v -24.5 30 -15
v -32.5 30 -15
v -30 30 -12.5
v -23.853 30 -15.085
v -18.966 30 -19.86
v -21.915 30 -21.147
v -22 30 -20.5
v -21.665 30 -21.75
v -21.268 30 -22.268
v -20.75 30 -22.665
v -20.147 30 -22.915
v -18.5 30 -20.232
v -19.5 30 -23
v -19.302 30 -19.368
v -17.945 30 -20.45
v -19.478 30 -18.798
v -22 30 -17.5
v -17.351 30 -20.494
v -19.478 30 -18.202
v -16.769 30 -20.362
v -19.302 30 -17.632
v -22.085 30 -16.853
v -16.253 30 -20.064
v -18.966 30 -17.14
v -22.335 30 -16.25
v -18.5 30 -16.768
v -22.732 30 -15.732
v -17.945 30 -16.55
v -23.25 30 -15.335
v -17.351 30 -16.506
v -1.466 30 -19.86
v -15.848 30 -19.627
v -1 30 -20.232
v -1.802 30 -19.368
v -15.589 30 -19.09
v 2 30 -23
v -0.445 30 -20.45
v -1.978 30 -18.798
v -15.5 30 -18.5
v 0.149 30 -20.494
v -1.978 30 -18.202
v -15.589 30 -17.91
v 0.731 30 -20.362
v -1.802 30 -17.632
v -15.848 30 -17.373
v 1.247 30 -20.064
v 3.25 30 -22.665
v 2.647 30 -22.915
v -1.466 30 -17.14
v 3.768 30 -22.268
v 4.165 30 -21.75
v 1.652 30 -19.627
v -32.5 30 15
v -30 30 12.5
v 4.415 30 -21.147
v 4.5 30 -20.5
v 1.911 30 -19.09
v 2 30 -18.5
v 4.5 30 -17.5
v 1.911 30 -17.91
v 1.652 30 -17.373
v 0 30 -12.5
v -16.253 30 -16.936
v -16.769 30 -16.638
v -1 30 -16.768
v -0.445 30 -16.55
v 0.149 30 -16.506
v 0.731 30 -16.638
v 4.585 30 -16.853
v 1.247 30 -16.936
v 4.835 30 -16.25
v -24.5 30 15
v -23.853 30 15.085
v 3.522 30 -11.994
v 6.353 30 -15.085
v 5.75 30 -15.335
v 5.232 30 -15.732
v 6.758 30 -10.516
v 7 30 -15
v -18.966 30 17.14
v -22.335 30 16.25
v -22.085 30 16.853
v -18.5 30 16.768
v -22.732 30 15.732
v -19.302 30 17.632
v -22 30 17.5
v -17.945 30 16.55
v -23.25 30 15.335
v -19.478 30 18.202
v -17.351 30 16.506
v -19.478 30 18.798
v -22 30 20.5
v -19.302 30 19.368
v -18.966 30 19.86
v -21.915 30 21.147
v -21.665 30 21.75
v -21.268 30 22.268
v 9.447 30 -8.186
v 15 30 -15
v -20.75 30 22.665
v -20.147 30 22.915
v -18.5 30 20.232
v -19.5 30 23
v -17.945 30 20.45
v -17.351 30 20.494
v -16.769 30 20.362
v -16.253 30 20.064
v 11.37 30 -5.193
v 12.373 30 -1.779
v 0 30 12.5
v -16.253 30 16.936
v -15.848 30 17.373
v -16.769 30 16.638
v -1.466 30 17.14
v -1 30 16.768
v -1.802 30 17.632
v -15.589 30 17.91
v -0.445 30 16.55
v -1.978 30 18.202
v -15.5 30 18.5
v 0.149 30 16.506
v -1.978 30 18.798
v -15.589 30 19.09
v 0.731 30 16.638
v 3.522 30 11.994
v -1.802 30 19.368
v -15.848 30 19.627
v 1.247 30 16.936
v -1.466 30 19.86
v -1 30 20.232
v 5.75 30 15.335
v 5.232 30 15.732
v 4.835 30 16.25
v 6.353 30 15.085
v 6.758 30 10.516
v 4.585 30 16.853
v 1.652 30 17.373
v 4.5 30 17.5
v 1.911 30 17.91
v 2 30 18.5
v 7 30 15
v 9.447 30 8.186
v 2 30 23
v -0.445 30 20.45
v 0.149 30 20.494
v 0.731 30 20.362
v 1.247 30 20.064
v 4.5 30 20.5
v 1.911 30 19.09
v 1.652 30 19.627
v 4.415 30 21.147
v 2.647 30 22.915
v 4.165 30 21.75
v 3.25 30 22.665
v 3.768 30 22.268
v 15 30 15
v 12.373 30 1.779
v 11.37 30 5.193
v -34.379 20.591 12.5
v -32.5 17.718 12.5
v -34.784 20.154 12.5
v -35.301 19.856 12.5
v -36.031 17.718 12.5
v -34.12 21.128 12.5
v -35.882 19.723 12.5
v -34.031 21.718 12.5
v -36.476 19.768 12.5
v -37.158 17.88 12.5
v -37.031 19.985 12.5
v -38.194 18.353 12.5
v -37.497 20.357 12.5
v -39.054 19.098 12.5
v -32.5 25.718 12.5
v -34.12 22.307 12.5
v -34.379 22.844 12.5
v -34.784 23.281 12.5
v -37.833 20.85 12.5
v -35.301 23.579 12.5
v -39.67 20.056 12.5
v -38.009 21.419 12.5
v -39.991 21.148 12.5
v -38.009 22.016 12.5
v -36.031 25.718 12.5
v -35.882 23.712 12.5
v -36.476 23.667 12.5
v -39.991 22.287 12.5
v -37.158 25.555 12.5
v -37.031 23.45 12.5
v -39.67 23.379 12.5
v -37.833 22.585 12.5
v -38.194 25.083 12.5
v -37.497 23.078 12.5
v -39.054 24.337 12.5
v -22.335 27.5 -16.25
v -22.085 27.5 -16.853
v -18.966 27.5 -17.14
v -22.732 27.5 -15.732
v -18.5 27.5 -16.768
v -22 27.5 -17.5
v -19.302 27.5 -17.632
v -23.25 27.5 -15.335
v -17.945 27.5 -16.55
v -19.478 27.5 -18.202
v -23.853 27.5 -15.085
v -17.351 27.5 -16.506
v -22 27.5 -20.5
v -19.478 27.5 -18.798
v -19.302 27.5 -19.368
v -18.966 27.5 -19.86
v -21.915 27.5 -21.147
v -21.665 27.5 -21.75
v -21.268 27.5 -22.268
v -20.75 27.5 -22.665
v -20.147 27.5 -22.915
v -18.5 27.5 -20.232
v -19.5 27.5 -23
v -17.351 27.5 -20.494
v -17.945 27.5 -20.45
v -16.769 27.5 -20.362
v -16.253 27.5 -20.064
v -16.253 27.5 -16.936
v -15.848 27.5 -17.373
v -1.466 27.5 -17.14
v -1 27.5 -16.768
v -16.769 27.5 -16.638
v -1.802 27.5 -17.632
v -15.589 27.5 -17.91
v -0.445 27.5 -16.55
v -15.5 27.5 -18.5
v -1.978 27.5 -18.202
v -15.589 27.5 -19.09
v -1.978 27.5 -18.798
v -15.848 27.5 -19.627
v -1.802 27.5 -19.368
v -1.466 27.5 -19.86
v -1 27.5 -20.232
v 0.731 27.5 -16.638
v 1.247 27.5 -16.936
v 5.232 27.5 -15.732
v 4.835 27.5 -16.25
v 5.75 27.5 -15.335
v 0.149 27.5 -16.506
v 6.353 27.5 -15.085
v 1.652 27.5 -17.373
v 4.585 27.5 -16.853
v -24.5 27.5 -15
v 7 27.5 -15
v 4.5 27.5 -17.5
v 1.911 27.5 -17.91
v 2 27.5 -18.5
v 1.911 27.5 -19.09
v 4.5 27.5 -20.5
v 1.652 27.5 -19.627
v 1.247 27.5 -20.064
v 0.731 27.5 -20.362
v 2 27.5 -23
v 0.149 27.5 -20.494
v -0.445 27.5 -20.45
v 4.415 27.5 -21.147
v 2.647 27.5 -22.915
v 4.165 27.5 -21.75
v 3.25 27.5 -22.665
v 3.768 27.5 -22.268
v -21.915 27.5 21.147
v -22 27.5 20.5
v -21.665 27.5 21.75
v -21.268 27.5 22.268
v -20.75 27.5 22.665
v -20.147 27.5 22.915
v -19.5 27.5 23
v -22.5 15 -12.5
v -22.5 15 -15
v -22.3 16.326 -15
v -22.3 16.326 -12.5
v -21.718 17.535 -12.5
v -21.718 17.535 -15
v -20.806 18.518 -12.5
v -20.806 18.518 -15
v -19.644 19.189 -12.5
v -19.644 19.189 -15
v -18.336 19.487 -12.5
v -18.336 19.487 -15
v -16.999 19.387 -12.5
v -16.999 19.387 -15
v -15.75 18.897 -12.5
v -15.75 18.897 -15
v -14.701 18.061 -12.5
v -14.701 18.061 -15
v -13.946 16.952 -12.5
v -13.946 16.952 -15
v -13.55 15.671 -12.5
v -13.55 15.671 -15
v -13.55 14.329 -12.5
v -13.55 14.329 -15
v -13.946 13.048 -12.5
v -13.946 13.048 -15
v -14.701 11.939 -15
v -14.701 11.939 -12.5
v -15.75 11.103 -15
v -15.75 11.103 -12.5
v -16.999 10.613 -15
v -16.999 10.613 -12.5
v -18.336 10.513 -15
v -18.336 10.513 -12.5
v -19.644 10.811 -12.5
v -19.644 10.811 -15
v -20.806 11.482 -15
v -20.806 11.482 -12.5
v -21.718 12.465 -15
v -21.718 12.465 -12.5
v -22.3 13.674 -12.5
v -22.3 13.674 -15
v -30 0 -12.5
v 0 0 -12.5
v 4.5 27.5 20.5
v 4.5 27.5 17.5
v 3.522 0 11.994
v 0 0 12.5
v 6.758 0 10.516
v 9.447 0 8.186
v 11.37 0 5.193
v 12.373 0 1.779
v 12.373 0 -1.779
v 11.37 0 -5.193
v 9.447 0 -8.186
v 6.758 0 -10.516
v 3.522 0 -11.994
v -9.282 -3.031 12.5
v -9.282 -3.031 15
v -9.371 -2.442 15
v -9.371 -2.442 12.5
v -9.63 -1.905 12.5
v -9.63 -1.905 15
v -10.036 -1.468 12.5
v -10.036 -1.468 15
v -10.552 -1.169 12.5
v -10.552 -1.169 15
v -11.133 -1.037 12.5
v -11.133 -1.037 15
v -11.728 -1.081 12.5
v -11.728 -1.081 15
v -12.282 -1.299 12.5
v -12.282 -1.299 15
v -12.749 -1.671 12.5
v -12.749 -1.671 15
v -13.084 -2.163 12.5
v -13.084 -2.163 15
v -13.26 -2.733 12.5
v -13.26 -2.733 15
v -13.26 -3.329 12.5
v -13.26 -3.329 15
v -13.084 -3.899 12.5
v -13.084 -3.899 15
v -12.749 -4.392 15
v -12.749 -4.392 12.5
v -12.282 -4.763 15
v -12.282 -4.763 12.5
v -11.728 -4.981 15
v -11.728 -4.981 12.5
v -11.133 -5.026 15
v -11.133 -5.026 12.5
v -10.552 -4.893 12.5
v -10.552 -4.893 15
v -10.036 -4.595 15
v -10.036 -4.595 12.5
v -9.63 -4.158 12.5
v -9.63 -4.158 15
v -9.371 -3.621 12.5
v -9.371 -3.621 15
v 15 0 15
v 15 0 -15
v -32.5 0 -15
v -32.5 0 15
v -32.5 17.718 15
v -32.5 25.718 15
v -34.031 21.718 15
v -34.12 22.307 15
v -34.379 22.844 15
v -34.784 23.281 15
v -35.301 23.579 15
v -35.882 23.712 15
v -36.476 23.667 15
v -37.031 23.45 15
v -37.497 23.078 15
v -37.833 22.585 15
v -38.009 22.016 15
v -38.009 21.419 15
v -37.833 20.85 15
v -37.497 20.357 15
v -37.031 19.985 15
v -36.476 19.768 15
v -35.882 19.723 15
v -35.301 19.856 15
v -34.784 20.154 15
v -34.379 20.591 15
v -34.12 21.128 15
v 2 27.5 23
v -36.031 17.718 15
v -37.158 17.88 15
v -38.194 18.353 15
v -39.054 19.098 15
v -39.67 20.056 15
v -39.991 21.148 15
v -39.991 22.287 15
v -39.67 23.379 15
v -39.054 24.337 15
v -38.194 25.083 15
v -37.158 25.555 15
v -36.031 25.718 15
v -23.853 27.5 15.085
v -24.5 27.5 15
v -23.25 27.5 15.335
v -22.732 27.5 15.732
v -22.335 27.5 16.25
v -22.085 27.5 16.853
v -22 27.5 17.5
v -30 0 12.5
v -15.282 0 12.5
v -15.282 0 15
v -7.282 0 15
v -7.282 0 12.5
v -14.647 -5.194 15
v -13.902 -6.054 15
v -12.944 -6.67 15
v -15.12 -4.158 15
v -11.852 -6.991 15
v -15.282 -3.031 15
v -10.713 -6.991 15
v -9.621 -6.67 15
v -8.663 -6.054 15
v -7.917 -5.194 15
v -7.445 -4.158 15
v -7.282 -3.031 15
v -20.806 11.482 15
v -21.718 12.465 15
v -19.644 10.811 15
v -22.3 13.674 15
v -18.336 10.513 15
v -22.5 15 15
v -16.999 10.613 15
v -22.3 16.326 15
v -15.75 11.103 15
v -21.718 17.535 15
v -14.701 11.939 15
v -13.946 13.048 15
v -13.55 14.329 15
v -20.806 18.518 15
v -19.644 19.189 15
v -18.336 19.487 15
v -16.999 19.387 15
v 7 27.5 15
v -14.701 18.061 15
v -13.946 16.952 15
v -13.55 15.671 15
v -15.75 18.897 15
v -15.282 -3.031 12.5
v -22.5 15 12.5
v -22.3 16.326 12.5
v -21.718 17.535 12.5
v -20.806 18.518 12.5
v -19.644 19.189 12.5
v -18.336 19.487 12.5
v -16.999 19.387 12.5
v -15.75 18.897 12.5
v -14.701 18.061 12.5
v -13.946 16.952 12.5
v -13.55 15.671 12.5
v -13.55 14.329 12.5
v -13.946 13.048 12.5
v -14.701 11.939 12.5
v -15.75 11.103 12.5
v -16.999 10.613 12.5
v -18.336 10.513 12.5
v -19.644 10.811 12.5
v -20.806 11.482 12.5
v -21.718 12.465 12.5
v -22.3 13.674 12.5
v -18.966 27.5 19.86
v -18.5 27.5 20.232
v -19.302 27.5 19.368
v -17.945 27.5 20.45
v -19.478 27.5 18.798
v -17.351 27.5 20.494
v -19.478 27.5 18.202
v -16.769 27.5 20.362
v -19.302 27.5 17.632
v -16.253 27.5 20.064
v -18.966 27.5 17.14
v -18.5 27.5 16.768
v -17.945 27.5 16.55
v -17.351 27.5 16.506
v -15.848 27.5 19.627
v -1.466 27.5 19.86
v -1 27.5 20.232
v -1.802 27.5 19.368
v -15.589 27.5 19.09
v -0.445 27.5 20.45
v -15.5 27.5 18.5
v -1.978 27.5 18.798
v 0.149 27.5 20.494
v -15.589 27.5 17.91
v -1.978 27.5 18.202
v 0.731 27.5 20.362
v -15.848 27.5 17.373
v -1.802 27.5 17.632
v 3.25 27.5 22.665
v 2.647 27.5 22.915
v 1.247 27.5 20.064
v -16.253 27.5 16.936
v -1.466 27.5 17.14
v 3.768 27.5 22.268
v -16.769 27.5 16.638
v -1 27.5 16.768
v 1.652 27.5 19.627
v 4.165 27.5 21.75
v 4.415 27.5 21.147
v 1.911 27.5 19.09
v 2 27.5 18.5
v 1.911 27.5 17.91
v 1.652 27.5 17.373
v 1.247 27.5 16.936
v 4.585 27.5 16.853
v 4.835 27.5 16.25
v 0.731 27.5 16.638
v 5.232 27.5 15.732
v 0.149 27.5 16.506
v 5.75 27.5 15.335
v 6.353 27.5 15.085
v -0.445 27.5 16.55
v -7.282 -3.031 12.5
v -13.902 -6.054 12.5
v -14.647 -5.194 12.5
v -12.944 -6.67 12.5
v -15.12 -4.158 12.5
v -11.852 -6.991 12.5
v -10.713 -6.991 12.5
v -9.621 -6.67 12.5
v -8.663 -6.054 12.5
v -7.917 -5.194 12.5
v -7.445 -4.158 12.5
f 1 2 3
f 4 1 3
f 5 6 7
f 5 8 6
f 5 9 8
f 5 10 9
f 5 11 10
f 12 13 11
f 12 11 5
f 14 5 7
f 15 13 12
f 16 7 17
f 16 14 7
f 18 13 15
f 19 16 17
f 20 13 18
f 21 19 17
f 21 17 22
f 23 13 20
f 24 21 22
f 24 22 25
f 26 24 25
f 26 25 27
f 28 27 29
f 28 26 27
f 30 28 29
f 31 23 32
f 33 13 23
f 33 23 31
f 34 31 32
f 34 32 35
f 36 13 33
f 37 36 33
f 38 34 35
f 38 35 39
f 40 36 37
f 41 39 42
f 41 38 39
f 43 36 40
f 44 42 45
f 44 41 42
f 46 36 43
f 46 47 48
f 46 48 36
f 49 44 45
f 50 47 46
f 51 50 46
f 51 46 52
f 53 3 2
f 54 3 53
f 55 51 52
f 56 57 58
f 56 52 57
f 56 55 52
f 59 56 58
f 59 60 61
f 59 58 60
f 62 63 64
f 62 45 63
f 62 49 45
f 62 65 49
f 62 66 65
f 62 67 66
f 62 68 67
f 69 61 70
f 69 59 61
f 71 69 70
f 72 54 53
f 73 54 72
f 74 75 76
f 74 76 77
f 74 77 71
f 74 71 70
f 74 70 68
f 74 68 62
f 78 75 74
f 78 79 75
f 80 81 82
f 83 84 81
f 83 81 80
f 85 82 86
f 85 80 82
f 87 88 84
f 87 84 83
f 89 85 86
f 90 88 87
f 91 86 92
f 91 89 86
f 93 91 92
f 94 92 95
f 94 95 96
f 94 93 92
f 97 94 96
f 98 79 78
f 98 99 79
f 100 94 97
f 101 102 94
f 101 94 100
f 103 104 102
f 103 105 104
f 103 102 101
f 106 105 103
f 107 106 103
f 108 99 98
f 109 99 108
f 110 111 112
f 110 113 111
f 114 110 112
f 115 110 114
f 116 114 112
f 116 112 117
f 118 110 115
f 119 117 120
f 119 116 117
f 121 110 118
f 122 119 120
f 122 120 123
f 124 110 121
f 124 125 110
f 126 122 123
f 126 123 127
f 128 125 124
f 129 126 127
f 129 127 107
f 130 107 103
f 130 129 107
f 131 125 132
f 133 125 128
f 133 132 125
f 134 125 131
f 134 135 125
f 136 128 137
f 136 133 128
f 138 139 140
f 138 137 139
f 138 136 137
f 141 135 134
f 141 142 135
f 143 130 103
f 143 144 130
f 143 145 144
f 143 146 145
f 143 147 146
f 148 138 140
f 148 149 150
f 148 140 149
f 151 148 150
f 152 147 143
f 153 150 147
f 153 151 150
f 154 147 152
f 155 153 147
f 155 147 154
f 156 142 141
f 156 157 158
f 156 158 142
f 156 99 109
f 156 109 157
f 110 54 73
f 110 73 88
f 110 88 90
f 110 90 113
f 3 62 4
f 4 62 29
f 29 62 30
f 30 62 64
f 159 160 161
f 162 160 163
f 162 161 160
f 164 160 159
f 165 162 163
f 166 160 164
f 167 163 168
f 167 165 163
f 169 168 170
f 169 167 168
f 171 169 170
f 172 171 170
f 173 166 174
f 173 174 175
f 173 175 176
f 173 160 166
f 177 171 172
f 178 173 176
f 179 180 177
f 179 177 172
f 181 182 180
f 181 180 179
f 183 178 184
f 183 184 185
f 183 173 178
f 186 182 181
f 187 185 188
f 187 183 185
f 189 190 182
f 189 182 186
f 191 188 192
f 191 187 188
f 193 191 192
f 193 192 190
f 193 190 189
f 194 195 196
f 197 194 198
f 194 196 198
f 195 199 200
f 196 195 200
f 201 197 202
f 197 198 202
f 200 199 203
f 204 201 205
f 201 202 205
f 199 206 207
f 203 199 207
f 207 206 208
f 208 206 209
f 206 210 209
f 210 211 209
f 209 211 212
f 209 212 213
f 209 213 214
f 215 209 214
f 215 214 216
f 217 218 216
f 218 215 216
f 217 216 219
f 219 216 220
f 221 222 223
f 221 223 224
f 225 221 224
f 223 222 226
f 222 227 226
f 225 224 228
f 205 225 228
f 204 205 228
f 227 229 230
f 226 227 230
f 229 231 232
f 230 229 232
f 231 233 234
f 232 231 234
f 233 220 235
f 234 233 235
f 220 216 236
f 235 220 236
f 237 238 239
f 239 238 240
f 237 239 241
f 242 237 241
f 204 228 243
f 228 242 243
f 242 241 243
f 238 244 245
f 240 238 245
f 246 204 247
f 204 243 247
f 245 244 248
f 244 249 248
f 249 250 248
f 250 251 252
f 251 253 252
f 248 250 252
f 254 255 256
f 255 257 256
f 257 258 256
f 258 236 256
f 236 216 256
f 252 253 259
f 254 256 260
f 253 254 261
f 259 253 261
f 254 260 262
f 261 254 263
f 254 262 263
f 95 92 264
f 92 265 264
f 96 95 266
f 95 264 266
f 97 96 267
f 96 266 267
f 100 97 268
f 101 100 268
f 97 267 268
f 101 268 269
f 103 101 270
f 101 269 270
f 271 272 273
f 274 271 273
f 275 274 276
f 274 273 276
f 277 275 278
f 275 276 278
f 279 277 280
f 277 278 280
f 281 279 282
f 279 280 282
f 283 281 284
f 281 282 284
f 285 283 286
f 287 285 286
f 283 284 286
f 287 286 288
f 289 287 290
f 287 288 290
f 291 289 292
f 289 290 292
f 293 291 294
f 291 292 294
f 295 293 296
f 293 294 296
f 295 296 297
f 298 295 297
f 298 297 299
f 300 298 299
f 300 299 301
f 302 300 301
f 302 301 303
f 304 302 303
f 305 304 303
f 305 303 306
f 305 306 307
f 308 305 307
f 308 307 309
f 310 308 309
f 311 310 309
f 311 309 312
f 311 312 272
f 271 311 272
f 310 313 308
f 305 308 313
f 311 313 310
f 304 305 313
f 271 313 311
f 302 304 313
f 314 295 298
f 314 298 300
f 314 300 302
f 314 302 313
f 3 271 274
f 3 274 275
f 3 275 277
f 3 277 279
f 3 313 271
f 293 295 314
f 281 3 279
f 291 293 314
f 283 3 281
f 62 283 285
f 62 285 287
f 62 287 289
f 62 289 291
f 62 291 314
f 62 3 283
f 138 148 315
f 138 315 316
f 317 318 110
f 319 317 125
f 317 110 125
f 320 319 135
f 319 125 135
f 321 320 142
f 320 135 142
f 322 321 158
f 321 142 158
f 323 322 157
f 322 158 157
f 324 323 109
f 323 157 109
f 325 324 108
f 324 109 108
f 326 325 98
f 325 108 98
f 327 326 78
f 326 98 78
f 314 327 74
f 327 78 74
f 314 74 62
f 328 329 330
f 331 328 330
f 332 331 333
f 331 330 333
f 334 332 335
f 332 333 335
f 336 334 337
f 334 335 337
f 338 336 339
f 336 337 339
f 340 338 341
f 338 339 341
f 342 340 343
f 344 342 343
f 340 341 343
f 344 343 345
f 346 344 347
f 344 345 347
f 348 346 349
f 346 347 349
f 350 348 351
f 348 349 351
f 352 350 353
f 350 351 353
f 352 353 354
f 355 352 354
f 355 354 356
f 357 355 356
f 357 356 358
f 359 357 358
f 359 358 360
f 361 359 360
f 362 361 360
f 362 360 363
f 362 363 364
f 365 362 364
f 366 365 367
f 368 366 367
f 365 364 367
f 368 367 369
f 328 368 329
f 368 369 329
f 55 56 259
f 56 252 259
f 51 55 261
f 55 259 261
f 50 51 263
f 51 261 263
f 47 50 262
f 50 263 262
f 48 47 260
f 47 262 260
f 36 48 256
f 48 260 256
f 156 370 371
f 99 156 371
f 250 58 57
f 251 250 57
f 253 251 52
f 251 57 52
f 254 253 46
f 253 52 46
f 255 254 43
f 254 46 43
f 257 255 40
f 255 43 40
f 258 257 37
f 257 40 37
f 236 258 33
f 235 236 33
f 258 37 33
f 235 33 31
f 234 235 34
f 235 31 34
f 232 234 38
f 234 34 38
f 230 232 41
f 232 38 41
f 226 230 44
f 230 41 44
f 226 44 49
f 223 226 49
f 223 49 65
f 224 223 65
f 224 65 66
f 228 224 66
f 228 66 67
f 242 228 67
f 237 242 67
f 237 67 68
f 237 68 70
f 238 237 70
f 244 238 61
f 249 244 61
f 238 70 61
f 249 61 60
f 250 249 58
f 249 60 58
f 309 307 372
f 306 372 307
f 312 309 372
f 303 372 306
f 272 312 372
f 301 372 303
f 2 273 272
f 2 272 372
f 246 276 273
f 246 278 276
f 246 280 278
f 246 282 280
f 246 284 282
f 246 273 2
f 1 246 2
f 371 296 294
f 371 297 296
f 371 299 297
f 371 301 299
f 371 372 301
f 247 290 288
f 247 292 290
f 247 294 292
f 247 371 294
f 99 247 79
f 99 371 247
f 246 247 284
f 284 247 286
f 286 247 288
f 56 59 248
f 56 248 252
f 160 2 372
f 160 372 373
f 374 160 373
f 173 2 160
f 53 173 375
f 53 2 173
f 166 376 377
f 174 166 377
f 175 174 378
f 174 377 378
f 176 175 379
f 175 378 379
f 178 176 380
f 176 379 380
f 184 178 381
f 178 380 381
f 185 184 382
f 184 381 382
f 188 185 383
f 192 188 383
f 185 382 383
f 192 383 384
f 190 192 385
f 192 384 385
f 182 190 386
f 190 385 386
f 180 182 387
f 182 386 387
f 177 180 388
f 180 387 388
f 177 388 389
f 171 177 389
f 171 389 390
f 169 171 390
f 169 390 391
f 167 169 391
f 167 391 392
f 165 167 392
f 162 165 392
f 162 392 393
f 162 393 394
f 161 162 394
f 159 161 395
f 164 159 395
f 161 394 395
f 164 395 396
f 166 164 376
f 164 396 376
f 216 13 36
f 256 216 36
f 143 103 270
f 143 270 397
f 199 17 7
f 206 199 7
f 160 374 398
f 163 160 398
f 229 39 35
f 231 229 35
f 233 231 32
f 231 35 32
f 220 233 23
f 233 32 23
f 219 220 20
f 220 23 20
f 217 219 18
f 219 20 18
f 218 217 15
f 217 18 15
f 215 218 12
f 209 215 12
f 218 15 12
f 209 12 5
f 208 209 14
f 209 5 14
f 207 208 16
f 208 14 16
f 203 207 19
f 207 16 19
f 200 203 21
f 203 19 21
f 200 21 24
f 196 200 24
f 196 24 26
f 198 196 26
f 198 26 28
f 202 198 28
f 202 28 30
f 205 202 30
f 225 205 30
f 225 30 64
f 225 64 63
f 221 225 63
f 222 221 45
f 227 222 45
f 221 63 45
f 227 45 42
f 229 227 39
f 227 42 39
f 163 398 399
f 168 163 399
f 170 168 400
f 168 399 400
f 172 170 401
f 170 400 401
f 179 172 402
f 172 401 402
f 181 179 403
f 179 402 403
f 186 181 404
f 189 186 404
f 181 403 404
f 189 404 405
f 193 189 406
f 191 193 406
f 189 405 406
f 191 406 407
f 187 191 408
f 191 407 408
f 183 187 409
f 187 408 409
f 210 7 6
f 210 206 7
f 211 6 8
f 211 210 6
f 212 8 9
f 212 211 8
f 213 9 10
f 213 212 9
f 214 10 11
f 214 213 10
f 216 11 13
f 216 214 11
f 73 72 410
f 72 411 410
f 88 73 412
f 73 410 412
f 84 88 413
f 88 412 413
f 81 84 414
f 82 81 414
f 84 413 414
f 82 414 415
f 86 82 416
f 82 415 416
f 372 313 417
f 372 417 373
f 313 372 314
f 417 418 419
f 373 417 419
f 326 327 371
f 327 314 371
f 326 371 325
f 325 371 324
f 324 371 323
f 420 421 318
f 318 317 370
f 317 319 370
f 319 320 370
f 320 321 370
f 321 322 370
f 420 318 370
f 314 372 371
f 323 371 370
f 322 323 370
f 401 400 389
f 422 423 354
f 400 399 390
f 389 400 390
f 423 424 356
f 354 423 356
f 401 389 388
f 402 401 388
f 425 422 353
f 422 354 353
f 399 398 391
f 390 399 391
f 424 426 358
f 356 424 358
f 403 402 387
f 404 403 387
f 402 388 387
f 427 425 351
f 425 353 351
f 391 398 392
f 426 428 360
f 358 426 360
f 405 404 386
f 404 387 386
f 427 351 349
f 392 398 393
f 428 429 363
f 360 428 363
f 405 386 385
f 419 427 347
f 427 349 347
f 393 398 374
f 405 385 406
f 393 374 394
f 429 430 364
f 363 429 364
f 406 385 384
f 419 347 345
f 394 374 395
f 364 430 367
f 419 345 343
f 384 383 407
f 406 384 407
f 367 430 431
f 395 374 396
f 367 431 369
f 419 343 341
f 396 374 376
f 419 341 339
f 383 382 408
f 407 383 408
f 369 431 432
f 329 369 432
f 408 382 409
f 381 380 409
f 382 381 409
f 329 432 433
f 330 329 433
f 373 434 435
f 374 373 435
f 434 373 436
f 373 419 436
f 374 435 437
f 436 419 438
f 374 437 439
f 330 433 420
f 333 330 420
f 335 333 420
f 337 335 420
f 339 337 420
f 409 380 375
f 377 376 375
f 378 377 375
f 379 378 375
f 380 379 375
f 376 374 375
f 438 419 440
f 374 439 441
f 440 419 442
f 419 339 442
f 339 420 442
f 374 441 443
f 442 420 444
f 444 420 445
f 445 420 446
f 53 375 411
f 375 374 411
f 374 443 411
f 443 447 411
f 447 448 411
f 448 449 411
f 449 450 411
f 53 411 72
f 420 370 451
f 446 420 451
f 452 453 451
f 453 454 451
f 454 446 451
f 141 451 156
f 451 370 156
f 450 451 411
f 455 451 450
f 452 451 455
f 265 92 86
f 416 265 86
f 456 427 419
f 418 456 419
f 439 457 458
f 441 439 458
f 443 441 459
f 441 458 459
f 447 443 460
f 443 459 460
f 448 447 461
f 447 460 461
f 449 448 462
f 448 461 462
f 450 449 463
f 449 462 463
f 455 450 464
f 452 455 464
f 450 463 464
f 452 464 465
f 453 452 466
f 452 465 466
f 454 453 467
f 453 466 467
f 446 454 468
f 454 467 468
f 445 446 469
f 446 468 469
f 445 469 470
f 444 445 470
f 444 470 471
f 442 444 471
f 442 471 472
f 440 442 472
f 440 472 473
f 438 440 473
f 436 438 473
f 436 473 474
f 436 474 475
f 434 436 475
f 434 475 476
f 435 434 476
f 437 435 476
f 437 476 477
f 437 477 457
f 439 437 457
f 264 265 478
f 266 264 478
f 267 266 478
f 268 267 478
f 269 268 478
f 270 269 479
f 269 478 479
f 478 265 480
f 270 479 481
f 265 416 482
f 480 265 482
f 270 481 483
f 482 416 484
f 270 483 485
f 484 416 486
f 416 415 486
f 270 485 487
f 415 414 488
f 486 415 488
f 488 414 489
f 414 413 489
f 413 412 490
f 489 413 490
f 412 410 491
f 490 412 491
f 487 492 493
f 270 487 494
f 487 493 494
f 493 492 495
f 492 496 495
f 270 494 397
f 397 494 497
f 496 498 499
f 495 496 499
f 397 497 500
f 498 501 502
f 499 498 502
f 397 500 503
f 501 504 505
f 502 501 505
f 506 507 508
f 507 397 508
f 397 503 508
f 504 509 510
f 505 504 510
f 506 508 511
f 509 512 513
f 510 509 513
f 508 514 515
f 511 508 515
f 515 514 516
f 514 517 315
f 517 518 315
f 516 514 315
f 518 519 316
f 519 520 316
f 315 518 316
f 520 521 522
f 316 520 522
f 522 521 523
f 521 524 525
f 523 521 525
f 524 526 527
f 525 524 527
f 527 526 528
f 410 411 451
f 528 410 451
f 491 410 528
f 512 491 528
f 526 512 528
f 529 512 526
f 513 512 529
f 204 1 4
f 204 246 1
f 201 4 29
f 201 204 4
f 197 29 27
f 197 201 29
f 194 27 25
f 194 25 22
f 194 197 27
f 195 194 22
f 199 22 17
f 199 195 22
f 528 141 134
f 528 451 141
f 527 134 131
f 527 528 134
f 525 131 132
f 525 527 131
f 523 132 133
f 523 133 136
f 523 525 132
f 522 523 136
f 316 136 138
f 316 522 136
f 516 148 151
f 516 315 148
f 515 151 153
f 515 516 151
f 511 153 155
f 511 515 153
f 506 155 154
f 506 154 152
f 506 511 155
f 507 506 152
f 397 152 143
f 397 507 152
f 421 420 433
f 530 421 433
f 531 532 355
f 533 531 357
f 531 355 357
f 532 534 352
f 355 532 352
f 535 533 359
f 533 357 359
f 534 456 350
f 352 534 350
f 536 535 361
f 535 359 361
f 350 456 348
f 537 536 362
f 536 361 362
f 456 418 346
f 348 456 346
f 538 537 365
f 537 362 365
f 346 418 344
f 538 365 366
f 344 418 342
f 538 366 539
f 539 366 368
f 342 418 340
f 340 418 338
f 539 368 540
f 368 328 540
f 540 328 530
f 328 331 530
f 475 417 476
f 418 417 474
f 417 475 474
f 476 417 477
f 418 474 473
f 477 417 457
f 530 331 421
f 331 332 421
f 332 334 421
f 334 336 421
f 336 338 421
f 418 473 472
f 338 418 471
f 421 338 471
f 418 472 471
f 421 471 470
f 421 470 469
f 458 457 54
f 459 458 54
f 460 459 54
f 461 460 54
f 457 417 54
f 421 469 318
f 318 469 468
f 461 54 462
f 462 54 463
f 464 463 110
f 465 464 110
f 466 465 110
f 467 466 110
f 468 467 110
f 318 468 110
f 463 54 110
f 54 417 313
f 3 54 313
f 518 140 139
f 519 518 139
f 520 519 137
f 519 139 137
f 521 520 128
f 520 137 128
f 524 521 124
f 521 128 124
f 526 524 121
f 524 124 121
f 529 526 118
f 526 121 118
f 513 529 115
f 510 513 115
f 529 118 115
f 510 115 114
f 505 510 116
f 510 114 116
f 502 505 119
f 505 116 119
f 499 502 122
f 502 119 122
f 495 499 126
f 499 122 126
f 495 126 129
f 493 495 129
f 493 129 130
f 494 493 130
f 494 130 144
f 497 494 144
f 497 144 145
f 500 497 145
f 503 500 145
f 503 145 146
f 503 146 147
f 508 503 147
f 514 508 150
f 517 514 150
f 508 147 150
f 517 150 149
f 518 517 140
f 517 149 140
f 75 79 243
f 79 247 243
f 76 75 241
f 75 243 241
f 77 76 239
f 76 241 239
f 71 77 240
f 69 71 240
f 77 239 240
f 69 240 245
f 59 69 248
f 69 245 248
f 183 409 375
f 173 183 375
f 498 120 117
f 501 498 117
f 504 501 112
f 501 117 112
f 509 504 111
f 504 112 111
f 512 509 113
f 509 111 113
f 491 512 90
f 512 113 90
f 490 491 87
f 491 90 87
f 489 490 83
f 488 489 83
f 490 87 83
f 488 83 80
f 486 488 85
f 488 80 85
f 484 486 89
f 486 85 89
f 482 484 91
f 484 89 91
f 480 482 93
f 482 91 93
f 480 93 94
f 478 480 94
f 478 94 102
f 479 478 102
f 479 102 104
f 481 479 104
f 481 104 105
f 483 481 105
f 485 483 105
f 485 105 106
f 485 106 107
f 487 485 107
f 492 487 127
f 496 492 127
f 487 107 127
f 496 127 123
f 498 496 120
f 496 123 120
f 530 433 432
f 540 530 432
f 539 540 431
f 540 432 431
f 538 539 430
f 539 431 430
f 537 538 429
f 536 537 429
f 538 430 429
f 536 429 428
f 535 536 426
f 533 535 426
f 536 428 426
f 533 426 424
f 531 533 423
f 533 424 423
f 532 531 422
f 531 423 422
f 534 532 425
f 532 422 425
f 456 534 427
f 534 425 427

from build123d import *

# Parameters (mm, degrees)
CROQUIS1_W              = 30
CROQUIS1_H              = 30
SALIENTE_EXTRUIR1_DEPTH = 30
CROQUIS2_R              = 12.5
CORTAR_EXTRUIR1_DEPTH   = 30
CROQUIS4_W              = 30
CROQUIS4_H              = 30
SALIENTE_EXTRUIR5_DEPTH = 17.5
CROQUIS6_W              = 30
CROQUIS6_H              = 25
CORTAR_EXTRUIR3_DEPTH   = 37.5
CROQUIS7_R              = 4.5
CORTAR_EXTRUIR5_DEPTH   = 37.5
CROQUIS8_R              = 2
SALIENTE_EXTRUIR6_DEPTH = 2.5
CROQUIS9_W              = 26.5
CROQUIS9_H              = 8
CROQUIS9_R              = 2
SALIENTE_EXTRUIR7_DEPTH = 2.5
REDONDEO1_R             = 2.5


with BuildPart() as part:
    # Croquis1 → Saliente-Extruir1 (new body)
    with BuildSketch(Plane(origin=(0, 0, 0), x_dir=(1, 0, 0), z_dir=(0, 1, 0))):
        Rectangle(CROQUIS1_W, CROQUIS1_H)
    extrude(amount=SALIENTE_EXTRUIR1_DEPTH)

    # Croquis2 → Cortar-Extruir1 (cut)
    with BuildSketch(Plane(origin=(0, 30, 0), x_dir=(1, 0, 0), z_dir=(0, 1, 0))):
        Circle(CROQUIS2_R)
    extrude(amount=-CORTAR_EXTRUIR1_DEPTH, mode=Mode.SUBTRACT)

    # Croquis4 → Saliente-Extruir5 (add)
    with BuildSketch(Plane.ZY.offset(15)):
        with Locations((0, 15)):
            Rectangle(CROQUIS4_W, CROQUIS4_H)
    extrude(amount=SALIENTE_EXTRUIR5_DEPTH)

    # Croquis6 → Cortar-Extruir3 (cut)
    with BuildSketch(Plane(origin=(0, 30, 0), x_dir=(1, 0, 0), z_dir=(0, 1, 0))):
        with Locations((-15, 0)):
            Rectangle(CROQUIS6_W, CROQUIS6_H)
    extrude(amount=-CORTAR_EXTRUIR3_DEPTH, mode=Mode.SUBTRACT)

    # Croquis7 → Cortar-Extruir5 (cut)
    with BuildSketch(Plane(origin=(0, 0, -15), x_dir=(-1, 0, 0), z_dir=(0, 0, -1))):
        with Locations((18, 15)):
            Circle(CROQUIS7_R)
    extrude(amount=-CORTAR_EXTRUIR5_DEPTH, mode=Mode.SUBTRACT)

    # Croquis8 → Saliente-Extruir6 (add)
    with BuildSketch(Plane.XY.offset(15)):
        with BuildLine():
            Line((-36.03122292, 25.717514421), (-32.5, 25.717514421))
            Line((-32.5, 25.717514421), (-32.5, 17.717514421))
            Line((-32.5, 17.717514421), (-36.03122292, 17.717514421))
            ThreePointArc((-36.03122292, 17.717514421), (-40.03122292, 21.717514421), (-36.03122292, 25.717514421))
        make_face()
        with Locations((-36.03122292, 21.717514421)):
            Circle(CROQUIS8_R, mode=Mode.SUBTRACT)
        with BuildLine():
            Line((-15.282485579, -3.03122292), (-15.282485579, 0))
            Line((-15.282485579, 0), (-7.282485579, 0))
            Line((-7.282485579, 0), (-7.282485579, -3.03122292))
            ThreePointArc((-7.282485579, -3.03122292), (-11.282485579, -7.03122292), (-15.282485579, -3.03122292))
        make_face()
        with Locations((-11.282485579, -3.03122292)):
            Circle(CROQUIS8_R, mode=Mode.SUBTRACT)
    extrude(amount=-SALIENTE_EXTRUIR6_DEPTH)

    # Croquis9 → Saliente-Extruir7 (add)
    with BuildSketch(Plane(origin=(0, 30, 0), x_dir=(1, 0, 0), z_dir=(0, 1, 0))):
        with Locations((-8.75, 19)):
            Rectangle(CROQUIS9_W, CROQUIS9_H)
        with Locations((0, 18.5)):
            Circle(CROQUIS9_R, mode=Mode.SUBTRACT)
        with Locations((-17.5, 18.5)):
            Circle(CROQUIS9_R, mode=Mode.SUBTRACT)
        with Locations((-8.75, -19)):
            Rectangle(CROQUIS9_W, CROQUIS9_H)
        with Locations((0, -18.5)):
            Circle(CROQUIS9_R, mode=Mode.SUBTRACT)
        with Locations((-17.5, -18.5)):
            Circle(CROQUIS9_R, mode=Mode.SUBTRACT)
    extrude(amount=-SALIENTE_EXTRUIR7_DEPTH)

    # Redondeo1
    redondeo1_edges = [part.edges().sort_by_distance(p)[0] for p in [
        (-22, 28.75, 23),
        (-22, 28.75, 15),
        (4.5, 28.75, 15),
        (4.5, 28.75, 23),
        (-22, 28.75, -15),
        (-22, 28.75, -23),
        (4.5, 28.75, -23),
        (4.5, 28.75, -15),
    ]]
    fillet(redondeo1_edges, radius=REDONDEO1_R)


solid = part.part
